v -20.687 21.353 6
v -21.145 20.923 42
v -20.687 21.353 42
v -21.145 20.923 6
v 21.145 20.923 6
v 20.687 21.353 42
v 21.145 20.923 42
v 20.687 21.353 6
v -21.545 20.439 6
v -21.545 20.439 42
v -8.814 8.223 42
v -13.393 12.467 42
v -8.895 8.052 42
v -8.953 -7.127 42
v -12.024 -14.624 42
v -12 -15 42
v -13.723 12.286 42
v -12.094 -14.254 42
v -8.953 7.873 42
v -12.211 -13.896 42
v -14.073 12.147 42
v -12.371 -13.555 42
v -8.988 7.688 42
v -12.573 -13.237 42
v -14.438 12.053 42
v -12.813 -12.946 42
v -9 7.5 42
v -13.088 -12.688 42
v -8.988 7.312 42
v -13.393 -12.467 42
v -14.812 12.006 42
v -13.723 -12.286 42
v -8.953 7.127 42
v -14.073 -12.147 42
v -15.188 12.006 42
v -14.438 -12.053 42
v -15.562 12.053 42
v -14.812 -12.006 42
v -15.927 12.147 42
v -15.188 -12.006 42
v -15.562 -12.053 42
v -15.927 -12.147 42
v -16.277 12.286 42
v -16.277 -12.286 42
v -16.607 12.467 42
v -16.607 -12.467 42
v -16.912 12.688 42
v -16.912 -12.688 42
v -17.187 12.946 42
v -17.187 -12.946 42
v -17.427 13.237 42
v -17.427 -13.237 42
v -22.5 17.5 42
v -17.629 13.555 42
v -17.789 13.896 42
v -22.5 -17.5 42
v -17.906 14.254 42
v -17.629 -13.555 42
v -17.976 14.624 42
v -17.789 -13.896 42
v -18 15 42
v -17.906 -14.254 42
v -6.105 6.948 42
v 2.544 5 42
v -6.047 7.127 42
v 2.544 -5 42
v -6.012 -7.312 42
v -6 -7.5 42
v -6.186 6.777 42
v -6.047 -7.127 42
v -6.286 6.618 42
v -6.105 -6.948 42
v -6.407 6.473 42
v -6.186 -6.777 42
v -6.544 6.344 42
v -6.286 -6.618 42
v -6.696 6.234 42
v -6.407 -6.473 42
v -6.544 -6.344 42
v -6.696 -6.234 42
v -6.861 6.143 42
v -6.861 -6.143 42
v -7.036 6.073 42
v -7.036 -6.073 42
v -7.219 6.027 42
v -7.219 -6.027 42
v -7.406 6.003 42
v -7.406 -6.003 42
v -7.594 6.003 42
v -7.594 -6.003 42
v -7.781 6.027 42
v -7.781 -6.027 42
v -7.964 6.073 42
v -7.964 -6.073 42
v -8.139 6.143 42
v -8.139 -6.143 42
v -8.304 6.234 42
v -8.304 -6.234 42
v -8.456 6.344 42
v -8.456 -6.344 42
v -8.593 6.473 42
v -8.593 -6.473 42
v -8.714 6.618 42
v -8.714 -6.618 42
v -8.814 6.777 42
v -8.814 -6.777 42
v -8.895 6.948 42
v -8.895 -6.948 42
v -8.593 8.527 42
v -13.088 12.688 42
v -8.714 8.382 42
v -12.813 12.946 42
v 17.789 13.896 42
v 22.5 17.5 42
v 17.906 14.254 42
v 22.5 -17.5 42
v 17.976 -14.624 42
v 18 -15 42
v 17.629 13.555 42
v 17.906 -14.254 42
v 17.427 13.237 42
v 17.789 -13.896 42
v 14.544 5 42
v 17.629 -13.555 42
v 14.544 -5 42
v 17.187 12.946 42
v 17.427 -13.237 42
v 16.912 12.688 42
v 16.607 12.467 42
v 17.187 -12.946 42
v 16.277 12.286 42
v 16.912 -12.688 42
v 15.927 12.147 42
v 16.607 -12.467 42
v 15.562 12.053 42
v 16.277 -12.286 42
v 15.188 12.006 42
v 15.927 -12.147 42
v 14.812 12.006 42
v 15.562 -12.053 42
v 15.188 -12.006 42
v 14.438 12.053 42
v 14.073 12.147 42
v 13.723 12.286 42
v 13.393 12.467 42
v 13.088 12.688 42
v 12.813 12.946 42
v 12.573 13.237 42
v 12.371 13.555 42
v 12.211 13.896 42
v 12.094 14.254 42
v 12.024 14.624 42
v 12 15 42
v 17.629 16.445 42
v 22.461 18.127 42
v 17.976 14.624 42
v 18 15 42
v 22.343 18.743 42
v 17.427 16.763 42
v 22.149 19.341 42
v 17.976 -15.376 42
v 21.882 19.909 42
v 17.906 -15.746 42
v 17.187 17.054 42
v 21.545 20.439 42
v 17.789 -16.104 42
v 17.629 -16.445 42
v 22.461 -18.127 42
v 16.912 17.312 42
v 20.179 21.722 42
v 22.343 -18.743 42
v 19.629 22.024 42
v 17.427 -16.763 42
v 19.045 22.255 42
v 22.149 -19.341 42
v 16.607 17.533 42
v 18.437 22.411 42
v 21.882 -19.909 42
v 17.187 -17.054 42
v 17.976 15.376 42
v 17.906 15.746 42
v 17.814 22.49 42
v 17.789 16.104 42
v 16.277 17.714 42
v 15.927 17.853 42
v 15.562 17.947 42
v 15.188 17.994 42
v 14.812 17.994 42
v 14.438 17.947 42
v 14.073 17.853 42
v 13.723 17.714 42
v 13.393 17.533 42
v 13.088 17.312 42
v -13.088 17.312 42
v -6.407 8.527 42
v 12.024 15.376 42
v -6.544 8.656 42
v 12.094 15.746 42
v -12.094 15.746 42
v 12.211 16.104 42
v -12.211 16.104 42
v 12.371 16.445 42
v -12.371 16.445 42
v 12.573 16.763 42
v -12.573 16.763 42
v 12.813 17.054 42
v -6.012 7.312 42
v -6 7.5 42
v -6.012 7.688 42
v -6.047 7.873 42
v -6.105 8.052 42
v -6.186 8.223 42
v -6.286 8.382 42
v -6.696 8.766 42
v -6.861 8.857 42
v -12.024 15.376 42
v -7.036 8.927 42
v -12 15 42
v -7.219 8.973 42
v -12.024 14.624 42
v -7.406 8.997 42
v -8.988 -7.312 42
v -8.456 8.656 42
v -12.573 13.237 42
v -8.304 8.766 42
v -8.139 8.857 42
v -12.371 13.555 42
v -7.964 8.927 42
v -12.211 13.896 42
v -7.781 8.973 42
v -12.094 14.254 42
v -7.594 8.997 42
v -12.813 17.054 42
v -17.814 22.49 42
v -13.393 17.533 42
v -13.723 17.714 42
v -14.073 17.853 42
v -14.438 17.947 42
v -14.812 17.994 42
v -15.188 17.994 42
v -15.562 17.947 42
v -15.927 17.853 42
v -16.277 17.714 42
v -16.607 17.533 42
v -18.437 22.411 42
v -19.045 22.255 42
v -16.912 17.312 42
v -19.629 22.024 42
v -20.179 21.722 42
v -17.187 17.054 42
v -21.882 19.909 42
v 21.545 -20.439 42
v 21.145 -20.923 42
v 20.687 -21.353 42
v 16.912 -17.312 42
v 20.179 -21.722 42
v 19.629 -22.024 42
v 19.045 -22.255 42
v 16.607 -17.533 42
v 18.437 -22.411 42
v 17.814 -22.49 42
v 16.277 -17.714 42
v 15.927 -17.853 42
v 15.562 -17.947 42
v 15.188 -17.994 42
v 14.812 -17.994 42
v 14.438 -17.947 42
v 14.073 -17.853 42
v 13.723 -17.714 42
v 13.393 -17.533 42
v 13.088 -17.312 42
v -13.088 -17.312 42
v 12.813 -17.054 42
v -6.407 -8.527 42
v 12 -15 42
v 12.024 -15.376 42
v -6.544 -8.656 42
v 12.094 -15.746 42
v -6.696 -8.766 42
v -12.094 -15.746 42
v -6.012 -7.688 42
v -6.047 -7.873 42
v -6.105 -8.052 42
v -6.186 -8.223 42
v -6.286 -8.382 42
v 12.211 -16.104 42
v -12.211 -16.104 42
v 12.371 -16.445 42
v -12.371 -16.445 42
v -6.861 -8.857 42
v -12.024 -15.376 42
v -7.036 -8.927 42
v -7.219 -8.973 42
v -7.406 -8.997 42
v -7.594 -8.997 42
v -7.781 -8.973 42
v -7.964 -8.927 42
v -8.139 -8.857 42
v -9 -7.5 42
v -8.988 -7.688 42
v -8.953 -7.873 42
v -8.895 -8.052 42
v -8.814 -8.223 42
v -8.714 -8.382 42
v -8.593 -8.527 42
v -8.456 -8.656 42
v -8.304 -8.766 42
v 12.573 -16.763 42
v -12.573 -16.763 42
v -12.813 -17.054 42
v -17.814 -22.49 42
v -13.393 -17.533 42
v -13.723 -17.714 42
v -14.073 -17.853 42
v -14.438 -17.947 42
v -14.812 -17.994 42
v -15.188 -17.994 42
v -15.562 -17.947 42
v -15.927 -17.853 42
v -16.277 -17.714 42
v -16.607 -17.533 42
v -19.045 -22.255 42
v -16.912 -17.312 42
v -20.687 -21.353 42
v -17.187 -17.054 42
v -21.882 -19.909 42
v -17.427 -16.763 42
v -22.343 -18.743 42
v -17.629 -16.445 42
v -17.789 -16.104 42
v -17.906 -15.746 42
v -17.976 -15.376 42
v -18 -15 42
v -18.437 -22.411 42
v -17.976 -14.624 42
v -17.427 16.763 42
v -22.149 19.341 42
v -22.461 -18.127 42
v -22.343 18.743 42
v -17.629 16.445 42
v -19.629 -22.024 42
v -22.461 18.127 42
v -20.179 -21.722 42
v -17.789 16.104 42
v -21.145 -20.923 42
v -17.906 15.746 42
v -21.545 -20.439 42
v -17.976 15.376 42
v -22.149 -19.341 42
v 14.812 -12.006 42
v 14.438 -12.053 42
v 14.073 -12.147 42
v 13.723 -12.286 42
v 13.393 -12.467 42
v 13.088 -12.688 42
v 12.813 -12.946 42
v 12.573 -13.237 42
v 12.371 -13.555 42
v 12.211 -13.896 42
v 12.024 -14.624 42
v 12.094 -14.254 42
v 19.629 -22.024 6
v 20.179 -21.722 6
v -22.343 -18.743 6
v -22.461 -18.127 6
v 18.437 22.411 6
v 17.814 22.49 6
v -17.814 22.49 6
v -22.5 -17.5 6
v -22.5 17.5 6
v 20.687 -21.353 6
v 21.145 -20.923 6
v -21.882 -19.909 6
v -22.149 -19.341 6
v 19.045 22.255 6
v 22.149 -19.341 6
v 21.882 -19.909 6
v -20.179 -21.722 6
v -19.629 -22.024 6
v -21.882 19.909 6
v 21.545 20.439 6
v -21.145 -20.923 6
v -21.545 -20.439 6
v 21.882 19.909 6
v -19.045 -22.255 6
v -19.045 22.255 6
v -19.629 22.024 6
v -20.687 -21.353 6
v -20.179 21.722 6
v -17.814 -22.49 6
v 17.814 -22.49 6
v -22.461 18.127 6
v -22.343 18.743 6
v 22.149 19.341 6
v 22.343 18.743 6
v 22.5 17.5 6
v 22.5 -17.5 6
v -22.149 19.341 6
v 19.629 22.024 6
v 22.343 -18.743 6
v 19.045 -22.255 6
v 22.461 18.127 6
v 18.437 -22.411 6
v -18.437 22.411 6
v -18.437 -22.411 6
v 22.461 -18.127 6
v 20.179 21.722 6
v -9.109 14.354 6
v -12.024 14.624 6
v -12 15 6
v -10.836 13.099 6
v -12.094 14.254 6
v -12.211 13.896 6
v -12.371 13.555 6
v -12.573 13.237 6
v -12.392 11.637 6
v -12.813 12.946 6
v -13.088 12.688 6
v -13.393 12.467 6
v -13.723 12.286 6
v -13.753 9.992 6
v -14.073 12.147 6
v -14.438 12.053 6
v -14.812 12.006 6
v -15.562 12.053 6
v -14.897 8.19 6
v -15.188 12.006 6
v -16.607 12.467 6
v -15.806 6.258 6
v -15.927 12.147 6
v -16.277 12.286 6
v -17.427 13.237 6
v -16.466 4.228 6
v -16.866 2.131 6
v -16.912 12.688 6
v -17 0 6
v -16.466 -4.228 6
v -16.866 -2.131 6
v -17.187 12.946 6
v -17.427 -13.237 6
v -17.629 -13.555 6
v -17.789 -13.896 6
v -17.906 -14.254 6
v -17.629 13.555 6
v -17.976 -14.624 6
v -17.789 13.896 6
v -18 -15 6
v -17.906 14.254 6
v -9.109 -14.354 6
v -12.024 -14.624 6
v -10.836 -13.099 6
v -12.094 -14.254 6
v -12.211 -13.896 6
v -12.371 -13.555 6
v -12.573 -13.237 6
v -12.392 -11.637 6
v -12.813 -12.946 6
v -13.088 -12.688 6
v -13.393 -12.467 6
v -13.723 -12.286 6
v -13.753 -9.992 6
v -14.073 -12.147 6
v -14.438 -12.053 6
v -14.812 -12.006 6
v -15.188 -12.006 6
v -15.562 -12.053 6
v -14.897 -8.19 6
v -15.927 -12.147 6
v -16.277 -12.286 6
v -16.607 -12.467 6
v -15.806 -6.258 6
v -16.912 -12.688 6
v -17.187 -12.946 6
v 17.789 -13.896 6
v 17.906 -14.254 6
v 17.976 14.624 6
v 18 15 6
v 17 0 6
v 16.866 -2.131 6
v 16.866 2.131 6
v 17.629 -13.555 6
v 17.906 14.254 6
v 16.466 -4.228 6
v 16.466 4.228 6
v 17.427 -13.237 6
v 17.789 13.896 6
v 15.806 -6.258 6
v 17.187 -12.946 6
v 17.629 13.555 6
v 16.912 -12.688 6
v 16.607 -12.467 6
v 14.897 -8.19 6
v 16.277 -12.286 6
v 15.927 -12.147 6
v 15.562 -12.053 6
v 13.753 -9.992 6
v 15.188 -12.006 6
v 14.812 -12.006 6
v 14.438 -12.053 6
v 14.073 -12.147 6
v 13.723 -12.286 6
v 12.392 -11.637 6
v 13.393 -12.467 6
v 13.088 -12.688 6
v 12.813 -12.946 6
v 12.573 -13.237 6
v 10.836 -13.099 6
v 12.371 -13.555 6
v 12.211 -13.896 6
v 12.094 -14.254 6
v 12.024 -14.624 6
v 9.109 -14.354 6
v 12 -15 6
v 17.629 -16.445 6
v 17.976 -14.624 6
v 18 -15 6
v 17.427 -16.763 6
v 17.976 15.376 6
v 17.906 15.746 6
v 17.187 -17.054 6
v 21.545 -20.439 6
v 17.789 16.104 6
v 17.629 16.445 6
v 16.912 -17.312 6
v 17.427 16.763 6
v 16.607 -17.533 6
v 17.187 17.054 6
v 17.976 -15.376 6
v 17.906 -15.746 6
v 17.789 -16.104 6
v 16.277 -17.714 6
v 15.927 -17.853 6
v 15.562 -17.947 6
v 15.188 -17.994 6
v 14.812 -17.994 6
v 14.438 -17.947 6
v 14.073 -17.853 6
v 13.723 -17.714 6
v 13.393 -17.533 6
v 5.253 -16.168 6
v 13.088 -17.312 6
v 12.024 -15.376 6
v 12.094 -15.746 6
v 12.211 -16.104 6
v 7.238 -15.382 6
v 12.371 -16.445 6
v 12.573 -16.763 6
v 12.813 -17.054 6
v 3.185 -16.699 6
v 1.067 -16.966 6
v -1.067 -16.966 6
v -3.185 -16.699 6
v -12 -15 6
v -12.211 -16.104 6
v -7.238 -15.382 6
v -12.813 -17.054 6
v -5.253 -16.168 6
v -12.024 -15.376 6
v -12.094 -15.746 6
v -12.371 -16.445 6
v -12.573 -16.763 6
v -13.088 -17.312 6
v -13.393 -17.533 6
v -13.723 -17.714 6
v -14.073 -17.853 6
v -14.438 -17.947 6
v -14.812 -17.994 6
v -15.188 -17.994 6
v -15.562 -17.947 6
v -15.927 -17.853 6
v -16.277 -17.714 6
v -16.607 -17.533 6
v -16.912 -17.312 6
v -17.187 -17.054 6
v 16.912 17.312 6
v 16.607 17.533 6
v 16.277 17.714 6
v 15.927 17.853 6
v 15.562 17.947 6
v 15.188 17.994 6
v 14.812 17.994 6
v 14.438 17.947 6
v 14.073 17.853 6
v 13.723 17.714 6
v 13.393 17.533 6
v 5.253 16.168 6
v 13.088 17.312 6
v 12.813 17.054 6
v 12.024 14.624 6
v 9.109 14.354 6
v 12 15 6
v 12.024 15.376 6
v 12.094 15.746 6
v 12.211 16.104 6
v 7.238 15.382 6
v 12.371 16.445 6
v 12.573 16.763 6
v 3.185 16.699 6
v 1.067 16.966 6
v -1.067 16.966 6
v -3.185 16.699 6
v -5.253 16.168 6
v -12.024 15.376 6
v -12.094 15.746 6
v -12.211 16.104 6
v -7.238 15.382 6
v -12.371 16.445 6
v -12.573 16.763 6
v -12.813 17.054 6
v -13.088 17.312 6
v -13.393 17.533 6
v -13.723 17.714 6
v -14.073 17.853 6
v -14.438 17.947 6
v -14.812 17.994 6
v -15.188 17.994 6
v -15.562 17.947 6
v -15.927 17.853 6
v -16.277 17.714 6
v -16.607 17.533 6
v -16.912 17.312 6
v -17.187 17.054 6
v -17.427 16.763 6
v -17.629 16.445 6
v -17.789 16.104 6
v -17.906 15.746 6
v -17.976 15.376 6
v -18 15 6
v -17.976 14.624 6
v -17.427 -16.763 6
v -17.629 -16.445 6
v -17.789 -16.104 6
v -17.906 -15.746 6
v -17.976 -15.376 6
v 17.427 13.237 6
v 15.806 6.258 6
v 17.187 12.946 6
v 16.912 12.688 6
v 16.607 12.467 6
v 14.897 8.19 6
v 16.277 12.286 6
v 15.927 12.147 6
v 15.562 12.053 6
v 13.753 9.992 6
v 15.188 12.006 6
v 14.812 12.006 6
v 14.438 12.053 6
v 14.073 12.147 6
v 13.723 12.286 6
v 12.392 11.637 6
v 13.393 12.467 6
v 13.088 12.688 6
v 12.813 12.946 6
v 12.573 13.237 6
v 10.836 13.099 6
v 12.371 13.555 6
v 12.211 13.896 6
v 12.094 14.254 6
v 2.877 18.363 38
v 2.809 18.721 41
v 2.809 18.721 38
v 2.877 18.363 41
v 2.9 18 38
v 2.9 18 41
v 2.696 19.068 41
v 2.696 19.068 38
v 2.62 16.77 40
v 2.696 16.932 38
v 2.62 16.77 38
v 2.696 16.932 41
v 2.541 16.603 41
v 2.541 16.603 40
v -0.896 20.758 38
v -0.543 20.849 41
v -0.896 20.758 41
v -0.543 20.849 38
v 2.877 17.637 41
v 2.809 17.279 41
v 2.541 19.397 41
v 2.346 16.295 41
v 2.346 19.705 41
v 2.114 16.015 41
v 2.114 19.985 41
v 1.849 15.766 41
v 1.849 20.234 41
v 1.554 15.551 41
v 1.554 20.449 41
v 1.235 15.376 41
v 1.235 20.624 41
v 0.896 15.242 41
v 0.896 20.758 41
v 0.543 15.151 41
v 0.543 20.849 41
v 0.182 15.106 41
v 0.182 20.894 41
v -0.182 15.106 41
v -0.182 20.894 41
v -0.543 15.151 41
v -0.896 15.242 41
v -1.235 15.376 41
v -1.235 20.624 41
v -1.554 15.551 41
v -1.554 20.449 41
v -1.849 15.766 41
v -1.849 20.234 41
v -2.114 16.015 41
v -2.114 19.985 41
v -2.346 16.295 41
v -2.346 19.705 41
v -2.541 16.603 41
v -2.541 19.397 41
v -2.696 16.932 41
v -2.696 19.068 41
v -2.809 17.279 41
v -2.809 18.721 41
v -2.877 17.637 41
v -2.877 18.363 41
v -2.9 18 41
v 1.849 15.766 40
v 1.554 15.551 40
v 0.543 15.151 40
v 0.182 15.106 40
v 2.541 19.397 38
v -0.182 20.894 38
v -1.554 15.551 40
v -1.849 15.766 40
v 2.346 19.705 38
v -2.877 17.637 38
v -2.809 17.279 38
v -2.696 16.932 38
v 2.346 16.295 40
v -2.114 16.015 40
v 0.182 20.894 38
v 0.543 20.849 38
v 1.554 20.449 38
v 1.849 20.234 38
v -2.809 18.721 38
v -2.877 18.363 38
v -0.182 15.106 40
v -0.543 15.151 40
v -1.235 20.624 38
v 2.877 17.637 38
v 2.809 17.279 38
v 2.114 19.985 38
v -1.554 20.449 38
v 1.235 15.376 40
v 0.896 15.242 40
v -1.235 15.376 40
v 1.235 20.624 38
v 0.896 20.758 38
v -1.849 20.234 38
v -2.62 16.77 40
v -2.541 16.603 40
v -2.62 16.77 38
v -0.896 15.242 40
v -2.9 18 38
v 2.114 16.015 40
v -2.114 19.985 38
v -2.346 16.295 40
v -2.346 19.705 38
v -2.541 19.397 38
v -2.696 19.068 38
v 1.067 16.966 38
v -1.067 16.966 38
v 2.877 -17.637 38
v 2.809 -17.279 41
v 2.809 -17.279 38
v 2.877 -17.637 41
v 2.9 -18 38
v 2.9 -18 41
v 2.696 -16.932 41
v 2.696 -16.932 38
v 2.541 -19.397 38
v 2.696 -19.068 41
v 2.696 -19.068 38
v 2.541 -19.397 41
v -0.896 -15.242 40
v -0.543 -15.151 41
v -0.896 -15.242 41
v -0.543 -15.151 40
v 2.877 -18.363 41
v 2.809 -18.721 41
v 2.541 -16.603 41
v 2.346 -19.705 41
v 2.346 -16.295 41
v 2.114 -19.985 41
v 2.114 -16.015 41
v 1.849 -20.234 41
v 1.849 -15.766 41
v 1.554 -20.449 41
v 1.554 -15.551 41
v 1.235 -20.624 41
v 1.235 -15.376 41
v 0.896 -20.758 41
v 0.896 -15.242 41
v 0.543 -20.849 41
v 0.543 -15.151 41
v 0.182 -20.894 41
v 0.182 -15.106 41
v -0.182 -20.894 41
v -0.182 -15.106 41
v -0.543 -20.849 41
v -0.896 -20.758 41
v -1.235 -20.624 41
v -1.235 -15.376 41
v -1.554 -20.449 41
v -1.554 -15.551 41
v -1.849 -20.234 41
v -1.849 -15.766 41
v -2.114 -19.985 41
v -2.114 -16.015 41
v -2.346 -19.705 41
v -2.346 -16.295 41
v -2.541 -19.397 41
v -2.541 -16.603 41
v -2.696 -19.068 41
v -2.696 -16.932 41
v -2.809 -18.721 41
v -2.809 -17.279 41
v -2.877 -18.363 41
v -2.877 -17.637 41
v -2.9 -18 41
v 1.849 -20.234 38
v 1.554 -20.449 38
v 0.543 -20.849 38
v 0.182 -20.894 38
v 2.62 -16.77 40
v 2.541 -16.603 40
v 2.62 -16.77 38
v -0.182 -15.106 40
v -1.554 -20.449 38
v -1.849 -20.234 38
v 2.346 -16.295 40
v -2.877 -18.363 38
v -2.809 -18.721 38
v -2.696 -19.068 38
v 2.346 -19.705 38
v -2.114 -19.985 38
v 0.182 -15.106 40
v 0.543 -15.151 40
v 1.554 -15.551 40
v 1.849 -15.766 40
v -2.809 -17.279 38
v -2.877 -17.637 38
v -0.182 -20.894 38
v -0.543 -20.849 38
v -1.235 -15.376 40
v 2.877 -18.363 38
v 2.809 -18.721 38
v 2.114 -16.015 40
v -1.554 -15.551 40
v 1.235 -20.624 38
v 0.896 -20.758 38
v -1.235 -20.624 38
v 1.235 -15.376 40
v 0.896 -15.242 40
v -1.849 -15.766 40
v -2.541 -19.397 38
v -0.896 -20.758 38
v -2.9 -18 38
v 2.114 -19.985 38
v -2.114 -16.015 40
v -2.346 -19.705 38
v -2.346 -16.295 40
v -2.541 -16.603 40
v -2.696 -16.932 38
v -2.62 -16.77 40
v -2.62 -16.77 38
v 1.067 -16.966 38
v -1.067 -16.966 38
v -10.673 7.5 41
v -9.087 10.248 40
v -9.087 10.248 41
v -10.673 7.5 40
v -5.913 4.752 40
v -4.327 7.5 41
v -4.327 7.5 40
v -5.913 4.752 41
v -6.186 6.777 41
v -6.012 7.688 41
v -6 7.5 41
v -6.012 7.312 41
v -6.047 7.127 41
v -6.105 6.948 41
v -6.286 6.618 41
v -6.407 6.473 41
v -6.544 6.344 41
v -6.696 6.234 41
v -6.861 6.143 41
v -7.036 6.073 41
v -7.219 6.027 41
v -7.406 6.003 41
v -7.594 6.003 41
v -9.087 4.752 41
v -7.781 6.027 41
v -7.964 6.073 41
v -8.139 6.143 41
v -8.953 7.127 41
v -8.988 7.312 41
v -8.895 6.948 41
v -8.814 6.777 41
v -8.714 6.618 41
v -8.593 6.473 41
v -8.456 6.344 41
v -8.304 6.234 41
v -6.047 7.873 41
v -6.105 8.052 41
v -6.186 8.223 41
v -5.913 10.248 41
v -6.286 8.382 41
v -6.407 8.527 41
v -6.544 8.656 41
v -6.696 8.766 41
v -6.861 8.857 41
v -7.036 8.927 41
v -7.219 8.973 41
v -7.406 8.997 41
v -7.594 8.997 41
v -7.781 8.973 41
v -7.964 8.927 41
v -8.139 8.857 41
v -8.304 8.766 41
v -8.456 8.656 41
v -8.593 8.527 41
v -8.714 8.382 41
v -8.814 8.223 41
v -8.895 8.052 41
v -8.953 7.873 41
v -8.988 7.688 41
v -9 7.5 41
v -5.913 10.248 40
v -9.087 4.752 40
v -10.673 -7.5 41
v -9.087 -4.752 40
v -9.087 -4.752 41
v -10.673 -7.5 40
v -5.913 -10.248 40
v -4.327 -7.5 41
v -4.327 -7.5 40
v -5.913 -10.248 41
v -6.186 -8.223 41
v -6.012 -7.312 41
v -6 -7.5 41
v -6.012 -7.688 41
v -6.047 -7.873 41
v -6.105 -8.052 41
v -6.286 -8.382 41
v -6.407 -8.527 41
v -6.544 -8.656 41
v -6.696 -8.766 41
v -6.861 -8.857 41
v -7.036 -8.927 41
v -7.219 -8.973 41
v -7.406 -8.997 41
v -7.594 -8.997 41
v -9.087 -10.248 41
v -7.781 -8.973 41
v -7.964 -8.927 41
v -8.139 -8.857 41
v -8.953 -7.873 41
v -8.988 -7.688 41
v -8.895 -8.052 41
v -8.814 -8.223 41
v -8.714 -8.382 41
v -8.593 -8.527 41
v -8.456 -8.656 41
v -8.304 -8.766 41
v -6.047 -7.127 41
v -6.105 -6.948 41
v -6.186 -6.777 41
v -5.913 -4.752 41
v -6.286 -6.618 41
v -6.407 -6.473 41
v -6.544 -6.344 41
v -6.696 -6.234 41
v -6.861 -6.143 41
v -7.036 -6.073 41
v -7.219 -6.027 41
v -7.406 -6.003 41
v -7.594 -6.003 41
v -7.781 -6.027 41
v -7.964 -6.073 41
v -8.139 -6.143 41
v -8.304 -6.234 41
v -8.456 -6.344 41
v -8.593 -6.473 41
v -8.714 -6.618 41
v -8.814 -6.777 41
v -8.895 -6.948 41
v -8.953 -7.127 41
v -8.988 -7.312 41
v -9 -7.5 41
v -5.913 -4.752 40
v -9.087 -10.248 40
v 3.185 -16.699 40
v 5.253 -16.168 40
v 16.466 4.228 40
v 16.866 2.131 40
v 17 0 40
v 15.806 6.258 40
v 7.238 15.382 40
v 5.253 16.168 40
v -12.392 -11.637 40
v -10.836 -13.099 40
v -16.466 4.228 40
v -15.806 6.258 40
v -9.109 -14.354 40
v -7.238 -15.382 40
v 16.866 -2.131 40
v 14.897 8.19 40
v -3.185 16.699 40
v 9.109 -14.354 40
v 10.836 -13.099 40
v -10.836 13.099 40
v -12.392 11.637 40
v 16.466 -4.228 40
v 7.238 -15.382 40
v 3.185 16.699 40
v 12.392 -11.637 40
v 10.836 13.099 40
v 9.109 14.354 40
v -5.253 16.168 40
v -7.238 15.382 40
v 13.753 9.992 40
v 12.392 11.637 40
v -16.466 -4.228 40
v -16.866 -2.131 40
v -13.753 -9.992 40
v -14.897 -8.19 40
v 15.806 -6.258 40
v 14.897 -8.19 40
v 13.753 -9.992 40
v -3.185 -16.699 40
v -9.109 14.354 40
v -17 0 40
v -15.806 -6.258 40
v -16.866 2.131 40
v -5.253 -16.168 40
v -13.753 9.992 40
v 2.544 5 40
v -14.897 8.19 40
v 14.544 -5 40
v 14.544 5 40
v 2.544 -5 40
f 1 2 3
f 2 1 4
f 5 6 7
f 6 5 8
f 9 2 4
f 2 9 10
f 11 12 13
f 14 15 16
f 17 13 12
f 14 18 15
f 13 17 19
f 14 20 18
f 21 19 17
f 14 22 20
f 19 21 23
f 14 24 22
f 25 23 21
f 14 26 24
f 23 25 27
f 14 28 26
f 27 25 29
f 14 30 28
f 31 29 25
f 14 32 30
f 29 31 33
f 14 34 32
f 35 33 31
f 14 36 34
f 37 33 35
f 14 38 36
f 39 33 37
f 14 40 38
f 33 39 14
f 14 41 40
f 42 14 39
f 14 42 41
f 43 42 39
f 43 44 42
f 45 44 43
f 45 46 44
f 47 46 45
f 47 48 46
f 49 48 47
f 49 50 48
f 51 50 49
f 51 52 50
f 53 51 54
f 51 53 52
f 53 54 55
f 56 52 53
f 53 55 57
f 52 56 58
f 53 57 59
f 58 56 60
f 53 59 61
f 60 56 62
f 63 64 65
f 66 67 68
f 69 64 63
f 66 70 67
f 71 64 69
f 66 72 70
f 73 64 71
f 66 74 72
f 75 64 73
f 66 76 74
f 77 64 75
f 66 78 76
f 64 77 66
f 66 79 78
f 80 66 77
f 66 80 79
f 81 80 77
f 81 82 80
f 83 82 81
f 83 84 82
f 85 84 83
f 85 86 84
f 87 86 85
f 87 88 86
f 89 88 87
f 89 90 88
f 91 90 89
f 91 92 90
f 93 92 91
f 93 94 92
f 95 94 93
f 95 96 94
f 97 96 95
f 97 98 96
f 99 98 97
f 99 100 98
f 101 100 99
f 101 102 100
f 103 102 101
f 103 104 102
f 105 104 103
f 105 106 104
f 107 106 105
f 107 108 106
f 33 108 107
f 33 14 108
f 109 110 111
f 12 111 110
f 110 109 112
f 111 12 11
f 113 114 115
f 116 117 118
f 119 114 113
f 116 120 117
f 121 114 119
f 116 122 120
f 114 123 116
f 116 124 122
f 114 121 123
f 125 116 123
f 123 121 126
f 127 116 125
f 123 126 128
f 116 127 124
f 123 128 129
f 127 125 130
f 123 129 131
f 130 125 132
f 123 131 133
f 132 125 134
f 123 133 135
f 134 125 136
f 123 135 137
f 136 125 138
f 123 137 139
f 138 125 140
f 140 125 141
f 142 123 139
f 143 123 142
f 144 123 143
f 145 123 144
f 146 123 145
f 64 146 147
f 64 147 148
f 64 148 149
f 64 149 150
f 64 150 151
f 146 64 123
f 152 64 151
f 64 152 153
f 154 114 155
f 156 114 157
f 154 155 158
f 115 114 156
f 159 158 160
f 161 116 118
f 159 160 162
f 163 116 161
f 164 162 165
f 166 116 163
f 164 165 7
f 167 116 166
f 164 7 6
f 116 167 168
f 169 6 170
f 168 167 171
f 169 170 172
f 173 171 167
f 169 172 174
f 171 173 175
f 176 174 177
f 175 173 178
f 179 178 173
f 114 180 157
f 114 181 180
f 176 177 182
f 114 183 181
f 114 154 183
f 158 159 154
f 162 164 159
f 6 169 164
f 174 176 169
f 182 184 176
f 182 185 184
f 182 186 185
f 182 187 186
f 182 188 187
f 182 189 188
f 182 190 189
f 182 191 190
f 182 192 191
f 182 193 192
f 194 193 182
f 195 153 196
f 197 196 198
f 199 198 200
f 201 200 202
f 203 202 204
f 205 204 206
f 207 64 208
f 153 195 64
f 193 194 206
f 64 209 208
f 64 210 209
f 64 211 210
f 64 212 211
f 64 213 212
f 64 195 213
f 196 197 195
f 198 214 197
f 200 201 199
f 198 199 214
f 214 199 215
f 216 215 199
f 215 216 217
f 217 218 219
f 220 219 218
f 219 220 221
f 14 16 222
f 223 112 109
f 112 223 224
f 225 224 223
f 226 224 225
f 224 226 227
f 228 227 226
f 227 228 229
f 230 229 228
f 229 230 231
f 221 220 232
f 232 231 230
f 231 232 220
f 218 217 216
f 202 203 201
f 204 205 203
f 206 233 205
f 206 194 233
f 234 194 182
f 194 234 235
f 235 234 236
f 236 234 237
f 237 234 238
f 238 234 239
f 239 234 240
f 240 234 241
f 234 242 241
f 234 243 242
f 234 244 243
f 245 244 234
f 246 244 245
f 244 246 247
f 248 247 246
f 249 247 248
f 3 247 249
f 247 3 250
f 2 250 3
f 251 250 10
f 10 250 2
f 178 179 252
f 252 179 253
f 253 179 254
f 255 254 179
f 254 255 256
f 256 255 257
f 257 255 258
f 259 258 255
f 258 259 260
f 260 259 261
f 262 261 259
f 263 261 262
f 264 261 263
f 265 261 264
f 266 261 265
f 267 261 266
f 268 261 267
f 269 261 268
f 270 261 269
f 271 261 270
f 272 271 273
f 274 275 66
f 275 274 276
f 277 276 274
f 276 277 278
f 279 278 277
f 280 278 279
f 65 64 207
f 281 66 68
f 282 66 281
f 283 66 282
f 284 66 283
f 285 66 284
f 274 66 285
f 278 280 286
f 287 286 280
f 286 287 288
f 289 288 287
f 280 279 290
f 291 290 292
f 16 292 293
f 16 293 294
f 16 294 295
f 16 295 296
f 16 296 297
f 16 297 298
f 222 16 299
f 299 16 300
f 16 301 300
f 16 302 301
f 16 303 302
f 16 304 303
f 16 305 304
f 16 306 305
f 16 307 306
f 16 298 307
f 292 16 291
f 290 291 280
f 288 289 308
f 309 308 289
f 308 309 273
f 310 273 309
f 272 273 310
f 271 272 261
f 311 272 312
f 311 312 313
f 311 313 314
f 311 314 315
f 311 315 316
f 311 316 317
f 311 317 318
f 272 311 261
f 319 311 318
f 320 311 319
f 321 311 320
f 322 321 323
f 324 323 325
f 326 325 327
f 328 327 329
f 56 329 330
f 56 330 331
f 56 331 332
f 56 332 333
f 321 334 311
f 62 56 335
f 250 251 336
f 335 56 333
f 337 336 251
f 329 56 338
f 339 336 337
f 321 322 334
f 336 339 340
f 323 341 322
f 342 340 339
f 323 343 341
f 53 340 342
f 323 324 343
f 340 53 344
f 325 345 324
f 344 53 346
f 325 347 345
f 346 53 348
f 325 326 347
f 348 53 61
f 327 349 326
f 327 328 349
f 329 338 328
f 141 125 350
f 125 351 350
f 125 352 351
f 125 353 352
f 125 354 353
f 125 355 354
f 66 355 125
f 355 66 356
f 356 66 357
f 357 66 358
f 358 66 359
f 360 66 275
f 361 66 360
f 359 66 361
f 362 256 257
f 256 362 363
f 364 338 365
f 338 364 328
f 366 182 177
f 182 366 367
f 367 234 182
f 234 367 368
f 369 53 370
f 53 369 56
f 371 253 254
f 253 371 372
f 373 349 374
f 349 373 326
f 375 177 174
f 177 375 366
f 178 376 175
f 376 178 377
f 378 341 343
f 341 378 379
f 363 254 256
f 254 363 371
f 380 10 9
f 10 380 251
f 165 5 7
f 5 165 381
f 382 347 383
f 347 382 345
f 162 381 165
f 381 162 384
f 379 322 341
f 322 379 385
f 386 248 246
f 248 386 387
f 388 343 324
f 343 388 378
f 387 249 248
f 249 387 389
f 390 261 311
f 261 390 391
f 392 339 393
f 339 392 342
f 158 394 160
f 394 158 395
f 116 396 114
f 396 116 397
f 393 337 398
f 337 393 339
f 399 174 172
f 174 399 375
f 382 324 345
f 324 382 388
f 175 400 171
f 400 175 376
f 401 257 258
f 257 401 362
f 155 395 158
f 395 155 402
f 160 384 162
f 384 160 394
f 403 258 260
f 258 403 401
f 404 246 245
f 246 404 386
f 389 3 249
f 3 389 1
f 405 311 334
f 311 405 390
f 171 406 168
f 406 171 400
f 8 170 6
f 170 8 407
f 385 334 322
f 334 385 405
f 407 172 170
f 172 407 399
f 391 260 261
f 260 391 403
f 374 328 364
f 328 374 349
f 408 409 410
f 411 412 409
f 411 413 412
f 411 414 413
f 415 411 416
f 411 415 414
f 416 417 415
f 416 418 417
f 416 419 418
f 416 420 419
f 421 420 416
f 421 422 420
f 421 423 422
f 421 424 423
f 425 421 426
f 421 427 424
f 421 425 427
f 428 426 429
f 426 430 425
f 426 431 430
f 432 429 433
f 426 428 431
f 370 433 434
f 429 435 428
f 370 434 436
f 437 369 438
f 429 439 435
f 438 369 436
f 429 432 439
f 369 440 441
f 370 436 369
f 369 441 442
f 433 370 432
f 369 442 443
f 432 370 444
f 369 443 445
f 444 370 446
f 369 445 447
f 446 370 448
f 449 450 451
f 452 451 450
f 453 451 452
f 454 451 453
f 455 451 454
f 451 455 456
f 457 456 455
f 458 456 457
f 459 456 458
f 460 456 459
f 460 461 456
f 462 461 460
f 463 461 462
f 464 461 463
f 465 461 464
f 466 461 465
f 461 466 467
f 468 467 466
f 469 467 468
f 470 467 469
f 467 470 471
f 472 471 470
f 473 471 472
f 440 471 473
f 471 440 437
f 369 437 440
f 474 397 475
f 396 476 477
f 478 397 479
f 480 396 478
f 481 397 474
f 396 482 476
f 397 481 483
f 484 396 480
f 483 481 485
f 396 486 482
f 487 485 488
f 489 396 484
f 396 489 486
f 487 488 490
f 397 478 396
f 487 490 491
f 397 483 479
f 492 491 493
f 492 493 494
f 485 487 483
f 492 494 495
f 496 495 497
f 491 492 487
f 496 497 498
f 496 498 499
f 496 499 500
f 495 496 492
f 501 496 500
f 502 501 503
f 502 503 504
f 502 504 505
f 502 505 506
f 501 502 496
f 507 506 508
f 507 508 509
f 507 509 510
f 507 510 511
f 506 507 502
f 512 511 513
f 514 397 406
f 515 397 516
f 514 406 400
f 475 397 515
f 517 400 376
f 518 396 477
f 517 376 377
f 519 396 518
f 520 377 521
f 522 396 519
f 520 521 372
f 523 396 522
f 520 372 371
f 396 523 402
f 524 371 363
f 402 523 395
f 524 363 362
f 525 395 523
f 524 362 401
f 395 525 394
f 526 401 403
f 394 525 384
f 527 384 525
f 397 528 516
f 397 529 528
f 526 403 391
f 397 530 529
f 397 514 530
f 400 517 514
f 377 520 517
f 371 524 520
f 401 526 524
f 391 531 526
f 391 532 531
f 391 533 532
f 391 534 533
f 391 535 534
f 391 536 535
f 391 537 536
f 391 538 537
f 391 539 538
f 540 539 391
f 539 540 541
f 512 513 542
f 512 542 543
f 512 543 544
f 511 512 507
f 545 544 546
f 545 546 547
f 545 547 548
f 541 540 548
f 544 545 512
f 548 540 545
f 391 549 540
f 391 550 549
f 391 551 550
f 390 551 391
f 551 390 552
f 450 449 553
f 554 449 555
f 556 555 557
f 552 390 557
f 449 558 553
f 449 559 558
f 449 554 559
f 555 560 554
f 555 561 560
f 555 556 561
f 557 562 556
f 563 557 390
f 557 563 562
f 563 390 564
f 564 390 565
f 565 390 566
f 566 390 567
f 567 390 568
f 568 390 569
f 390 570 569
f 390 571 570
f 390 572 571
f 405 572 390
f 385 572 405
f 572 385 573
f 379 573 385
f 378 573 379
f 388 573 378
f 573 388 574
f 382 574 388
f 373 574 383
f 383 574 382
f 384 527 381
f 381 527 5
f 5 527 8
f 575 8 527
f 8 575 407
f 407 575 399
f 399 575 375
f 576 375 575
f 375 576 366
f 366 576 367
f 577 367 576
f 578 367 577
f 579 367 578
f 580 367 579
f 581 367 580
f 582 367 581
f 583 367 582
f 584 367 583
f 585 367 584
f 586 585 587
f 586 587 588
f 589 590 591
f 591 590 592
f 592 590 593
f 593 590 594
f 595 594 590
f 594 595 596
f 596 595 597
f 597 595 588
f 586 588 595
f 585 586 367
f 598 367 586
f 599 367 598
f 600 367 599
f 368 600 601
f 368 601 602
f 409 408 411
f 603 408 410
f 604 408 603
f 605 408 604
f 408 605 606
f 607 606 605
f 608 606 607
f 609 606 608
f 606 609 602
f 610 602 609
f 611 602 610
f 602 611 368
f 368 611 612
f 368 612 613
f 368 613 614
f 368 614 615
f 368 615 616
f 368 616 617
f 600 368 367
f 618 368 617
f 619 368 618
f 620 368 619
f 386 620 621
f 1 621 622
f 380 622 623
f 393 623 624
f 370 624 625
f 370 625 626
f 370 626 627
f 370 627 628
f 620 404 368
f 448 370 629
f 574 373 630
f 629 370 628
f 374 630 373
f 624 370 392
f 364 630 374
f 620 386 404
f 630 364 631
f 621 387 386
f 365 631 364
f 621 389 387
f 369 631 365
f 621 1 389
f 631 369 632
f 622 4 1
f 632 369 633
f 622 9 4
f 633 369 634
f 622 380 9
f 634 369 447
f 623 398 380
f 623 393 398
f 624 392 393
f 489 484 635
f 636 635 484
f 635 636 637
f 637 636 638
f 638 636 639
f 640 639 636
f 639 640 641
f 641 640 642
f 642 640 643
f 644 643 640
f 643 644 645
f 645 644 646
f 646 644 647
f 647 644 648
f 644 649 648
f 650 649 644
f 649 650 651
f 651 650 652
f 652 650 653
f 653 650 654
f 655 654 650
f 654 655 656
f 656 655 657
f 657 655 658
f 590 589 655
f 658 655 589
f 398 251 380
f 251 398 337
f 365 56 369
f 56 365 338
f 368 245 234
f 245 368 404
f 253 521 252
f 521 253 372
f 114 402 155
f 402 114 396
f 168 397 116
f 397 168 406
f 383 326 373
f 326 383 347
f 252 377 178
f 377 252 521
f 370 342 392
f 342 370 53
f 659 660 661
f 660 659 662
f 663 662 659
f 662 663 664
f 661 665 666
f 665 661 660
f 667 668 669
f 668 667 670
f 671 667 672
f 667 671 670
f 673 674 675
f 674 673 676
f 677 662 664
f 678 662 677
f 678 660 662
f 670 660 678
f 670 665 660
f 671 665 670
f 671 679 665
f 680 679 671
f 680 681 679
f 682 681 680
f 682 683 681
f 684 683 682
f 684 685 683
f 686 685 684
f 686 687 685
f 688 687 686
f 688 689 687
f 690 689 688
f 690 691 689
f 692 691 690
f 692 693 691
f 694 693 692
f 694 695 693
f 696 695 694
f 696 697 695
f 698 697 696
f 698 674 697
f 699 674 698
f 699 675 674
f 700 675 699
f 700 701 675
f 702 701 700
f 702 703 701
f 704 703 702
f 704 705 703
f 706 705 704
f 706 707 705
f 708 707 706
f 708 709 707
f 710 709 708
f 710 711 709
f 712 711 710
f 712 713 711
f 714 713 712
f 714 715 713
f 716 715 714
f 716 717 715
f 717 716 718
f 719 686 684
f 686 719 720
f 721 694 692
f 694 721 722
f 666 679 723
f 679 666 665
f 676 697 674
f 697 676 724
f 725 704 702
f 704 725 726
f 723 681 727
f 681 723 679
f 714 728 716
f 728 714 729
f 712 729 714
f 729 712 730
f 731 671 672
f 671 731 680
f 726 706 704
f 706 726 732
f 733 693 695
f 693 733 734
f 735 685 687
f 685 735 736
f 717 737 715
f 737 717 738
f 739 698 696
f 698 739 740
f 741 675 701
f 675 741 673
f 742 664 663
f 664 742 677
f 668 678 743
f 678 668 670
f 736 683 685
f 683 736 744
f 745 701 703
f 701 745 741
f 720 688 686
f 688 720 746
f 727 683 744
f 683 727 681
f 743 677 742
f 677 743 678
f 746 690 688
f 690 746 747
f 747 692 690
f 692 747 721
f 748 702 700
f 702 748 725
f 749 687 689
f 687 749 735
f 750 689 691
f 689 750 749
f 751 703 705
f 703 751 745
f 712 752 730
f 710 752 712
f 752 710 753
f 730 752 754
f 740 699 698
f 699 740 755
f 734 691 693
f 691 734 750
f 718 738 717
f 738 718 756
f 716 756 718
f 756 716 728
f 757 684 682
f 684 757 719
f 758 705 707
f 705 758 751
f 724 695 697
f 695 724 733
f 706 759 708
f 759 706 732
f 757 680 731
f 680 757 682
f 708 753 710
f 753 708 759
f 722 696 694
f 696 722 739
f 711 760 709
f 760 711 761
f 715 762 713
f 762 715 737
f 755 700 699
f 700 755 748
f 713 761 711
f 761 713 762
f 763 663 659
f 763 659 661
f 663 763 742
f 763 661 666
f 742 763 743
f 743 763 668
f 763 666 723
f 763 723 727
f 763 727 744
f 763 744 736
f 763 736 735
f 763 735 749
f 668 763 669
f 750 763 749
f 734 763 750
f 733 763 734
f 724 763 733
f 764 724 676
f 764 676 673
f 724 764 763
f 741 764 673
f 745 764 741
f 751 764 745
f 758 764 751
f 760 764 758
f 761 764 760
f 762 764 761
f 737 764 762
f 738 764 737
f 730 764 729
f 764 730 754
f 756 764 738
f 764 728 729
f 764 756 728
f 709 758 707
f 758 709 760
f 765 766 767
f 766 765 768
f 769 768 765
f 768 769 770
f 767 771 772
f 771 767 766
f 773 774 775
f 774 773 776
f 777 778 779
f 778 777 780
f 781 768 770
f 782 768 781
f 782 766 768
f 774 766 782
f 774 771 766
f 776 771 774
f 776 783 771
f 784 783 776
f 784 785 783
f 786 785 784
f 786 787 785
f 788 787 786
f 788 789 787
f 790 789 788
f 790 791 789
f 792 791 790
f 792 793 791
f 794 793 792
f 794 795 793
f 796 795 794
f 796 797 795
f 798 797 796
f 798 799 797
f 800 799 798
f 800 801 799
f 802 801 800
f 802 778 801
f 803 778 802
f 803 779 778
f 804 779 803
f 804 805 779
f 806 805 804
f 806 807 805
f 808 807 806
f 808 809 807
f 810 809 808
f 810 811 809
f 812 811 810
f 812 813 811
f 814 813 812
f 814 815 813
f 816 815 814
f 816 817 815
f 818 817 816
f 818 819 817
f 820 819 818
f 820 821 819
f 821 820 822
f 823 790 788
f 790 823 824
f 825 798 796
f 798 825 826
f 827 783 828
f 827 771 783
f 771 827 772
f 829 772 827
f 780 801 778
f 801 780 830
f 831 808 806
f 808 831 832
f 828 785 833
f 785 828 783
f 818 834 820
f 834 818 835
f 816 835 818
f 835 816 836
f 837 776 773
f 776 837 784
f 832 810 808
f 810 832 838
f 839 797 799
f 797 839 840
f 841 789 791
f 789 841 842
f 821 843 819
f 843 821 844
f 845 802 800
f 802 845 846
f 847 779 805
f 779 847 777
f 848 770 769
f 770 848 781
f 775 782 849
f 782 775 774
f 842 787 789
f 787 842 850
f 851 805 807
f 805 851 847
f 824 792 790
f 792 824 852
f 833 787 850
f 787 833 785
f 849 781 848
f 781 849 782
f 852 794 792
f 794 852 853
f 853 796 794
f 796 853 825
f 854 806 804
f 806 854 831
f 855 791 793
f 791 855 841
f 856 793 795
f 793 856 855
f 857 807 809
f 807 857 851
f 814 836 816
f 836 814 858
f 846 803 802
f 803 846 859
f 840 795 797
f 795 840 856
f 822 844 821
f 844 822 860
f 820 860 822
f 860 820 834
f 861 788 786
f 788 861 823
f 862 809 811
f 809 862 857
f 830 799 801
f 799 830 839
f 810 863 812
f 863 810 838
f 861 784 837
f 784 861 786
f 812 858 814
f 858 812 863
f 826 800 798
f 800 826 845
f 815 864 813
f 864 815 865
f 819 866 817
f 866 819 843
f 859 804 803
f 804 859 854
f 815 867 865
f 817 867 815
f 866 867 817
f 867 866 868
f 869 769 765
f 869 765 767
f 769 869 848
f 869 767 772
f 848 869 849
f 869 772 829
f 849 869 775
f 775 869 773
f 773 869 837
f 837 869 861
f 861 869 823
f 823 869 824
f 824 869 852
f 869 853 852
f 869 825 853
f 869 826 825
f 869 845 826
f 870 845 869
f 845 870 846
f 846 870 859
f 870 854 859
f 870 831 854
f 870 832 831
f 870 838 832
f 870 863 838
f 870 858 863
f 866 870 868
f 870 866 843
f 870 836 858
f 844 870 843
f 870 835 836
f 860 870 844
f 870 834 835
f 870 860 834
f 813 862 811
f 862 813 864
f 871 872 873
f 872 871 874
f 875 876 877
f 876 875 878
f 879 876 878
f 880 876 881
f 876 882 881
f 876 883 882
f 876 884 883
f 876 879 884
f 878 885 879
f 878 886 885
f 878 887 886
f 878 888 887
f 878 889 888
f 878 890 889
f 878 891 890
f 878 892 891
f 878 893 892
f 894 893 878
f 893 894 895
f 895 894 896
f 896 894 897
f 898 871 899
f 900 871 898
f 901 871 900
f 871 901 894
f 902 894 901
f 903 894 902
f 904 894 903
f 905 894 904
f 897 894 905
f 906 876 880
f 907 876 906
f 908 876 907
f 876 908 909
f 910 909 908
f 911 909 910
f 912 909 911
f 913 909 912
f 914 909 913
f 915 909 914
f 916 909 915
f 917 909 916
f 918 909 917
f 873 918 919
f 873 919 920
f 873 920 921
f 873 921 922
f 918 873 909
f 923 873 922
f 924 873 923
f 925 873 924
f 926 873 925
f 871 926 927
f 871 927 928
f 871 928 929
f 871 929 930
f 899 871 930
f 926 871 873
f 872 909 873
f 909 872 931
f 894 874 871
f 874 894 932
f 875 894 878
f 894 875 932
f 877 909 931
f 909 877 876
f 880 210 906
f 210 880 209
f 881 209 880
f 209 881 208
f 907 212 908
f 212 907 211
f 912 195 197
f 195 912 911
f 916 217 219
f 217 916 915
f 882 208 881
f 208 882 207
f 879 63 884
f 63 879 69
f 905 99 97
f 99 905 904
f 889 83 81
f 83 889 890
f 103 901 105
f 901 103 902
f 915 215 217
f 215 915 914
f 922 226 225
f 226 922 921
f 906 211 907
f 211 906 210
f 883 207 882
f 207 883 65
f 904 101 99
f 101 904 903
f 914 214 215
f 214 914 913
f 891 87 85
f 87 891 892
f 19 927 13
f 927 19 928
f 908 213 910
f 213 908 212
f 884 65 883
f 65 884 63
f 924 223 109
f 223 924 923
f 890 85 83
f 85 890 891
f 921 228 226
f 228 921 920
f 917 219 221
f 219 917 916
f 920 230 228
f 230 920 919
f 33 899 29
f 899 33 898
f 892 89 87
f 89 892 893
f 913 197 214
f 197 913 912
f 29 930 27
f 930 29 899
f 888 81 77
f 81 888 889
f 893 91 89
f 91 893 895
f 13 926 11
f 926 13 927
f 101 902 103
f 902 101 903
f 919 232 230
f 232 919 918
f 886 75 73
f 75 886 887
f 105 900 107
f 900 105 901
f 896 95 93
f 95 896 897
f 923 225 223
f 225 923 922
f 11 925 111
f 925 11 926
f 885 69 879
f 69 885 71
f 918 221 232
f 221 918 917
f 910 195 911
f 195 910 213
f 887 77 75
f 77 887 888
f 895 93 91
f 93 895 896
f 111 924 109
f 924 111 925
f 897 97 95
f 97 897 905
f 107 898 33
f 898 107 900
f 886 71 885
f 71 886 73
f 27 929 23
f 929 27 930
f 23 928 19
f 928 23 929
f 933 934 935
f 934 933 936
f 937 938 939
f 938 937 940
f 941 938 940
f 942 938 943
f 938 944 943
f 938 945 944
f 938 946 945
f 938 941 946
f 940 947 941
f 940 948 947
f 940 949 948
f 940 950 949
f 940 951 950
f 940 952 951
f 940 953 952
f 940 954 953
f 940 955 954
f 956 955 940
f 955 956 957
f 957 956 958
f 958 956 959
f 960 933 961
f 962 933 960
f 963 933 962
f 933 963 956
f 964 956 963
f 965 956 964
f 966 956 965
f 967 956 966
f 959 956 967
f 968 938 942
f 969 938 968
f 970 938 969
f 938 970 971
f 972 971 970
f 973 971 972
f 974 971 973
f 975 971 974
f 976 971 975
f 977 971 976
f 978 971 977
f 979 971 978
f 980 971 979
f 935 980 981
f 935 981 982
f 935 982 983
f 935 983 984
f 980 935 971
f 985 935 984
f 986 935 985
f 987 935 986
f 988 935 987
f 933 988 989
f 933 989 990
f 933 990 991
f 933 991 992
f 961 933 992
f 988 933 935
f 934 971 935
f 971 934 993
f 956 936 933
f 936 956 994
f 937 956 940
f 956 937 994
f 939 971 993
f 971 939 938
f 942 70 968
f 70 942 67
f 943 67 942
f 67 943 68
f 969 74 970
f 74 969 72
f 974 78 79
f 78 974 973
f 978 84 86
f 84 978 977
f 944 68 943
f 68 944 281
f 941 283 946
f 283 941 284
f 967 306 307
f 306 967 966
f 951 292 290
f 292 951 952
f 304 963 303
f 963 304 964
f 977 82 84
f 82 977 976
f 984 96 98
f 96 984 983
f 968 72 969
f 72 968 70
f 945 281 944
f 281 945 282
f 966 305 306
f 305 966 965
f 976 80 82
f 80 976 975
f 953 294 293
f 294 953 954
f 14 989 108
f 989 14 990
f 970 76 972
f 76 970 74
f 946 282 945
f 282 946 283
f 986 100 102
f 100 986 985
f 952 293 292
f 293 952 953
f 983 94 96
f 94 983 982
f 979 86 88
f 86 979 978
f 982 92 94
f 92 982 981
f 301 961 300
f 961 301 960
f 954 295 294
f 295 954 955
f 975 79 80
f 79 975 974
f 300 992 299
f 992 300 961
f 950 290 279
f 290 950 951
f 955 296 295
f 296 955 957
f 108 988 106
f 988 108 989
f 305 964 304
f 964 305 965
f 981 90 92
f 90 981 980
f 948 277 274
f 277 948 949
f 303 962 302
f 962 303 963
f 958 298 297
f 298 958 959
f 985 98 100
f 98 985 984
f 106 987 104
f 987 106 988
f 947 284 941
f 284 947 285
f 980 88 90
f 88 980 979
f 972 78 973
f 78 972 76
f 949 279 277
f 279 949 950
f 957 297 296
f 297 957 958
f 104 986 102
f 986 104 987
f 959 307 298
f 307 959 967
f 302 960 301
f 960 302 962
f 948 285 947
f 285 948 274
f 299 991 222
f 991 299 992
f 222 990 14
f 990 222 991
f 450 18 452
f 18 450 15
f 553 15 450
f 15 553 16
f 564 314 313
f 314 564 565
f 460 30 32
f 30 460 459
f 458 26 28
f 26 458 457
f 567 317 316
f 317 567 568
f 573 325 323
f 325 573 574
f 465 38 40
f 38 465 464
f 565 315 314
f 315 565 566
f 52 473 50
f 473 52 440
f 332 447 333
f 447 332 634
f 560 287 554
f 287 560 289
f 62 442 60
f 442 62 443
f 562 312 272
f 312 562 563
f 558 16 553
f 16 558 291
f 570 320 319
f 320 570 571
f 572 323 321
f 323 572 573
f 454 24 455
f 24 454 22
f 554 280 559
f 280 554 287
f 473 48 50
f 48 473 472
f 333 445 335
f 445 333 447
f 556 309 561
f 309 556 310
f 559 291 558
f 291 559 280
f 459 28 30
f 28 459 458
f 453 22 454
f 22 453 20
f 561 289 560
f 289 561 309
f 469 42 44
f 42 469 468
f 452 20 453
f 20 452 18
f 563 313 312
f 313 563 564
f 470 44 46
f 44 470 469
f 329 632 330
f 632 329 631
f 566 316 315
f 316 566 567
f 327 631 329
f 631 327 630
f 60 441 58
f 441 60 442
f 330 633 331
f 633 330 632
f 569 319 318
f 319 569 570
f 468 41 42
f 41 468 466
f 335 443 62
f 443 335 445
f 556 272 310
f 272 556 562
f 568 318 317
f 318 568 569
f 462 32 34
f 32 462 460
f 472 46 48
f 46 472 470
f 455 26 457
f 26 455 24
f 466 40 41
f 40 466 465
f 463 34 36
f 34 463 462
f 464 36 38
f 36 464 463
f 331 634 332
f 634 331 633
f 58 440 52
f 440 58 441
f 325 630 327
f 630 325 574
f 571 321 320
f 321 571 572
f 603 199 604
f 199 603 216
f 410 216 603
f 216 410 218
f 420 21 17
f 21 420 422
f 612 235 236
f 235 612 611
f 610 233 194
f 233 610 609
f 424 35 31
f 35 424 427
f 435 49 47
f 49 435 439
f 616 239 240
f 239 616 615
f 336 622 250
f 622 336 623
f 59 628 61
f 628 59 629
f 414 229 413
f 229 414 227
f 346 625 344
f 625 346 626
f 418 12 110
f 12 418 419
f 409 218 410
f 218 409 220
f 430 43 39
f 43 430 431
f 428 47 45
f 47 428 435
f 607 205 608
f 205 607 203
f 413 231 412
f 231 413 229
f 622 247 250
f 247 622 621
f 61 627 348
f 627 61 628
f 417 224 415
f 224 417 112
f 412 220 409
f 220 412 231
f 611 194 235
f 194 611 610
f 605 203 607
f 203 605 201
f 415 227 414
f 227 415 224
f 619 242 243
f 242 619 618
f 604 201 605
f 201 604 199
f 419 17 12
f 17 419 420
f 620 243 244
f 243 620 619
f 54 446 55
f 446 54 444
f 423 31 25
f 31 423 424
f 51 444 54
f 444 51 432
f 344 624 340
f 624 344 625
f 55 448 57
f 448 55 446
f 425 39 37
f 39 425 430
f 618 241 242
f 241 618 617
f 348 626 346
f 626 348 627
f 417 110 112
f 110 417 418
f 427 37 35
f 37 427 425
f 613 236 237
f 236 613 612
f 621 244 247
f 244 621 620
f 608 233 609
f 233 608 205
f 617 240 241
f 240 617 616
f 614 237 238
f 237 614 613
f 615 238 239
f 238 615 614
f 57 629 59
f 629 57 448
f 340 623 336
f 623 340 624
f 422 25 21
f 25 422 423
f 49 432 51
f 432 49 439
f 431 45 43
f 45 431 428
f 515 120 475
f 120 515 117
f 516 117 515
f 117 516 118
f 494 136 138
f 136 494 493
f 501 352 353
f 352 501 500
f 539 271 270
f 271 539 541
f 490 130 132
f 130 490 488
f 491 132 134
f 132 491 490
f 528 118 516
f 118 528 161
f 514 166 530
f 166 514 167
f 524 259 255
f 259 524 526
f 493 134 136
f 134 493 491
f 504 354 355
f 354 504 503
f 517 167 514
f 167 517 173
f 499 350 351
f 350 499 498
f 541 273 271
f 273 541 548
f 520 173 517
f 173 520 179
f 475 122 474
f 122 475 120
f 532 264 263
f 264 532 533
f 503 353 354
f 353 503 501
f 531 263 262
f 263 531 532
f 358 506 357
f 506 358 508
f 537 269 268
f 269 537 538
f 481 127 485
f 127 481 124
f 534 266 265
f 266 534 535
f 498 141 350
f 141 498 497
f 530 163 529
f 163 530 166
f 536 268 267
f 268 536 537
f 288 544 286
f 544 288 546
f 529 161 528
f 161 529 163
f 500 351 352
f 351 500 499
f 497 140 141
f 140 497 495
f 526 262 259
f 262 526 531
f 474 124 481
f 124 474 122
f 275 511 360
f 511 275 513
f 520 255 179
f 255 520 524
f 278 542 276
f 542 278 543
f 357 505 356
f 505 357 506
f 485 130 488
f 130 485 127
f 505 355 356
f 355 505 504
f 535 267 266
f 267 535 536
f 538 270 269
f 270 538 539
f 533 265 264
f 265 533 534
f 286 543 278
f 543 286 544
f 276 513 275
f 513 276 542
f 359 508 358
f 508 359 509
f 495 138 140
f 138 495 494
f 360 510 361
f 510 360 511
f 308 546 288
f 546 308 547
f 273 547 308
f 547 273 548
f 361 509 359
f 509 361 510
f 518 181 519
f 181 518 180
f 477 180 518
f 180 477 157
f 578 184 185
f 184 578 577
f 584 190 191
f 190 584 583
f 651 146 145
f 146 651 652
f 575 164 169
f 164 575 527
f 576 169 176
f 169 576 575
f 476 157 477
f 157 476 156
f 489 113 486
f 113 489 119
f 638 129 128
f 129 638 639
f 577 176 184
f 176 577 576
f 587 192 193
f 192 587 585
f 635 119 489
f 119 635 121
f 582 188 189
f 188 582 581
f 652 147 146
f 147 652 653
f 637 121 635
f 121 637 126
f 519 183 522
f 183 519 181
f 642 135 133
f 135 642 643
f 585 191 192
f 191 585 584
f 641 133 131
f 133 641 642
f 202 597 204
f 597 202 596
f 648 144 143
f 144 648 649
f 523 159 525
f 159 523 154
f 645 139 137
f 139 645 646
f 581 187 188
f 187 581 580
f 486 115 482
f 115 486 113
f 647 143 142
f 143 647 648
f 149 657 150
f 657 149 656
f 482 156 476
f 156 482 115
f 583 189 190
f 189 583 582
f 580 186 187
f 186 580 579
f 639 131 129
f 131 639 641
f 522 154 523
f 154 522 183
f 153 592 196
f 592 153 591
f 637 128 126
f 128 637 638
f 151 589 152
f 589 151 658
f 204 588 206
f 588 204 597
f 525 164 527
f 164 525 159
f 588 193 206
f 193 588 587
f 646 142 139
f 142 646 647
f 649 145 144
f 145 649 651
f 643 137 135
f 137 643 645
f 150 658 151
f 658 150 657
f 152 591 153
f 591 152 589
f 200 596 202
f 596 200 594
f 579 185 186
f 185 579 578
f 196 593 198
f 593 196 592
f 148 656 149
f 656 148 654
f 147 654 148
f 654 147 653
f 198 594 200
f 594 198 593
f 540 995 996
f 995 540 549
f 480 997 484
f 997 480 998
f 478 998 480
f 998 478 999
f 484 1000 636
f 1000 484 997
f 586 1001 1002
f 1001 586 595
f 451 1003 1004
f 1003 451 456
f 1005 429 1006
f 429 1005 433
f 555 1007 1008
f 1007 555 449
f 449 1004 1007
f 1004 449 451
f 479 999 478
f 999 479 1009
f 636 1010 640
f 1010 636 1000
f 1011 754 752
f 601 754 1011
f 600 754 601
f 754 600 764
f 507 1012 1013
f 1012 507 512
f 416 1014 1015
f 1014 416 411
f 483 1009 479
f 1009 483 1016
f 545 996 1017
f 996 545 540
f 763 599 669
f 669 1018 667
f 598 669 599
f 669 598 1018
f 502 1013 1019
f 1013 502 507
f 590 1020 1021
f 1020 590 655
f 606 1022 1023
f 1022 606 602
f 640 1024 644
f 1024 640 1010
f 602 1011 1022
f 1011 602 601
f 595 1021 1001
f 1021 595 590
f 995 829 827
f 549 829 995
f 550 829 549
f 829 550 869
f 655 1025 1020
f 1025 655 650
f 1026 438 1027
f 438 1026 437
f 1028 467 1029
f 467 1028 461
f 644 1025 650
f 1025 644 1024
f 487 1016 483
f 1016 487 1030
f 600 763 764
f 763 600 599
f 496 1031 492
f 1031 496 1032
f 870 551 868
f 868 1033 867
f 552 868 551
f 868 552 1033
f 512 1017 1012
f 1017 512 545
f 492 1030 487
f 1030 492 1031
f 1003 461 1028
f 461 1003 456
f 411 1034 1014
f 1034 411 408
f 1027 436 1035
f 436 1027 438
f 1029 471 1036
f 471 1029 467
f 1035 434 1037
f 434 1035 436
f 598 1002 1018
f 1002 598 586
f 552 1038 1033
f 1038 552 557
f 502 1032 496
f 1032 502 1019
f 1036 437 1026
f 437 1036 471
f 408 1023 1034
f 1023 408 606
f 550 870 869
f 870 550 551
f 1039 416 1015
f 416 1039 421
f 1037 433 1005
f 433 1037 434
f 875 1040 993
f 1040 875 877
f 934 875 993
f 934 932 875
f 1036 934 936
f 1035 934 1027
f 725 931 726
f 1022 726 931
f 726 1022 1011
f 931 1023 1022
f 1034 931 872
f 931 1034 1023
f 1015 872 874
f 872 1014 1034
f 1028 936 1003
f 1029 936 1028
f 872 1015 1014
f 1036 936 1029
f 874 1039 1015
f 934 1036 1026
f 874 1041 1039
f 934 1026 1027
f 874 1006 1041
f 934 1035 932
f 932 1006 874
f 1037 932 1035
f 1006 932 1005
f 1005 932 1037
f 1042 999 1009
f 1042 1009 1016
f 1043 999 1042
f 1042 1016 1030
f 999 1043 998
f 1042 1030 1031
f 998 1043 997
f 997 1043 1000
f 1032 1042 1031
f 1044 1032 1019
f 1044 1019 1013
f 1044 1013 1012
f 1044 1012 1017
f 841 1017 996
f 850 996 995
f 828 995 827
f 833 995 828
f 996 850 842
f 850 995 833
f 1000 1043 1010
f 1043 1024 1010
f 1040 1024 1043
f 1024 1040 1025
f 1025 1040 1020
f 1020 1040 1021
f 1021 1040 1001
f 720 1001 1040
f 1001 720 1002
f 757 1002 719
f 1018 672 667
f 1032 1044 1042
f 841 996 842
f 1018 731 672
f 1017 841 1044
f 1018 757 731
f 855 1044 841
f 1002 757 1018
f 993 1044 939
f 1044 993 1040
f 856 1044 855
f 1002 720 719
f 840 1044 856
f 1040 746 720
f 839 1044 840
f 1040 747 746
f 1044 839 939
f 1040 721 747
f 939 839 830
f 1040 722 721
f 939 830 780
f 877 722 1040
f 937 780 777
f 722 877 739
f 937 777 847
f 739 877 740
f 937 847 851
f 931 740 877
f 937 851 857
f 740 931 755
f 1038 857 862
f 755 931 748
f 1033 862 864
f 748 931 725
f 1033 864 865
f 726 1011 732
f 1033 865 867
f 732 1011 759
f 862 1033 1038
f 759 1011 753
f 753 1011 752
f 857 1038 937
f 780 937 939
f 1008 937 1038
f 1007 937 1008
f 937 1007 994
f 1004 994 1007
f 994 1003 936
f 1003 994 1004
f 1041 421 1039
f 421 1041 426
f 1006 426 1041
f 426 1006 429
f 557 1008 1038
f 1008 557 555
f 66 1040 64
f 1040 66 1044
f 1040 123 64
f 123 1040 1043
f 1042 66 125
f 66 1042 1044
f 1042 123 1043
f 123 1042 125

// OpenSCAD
$fn = 50;


difference() {
	union() {
		translate(v = [0, 0, 6]) {
			hull() {
				translate(v = [-17.5000000000, 17.5000000000, 0]) {
					cylinder(h = 36, r = 5);
				}
				translate(v = [17.5000000000, 17.5000000000, 0]) {
					cylinder(h = 36, r = 5);
				}
				translate(v = [-17.5000000000, -17.5000000000, 0]) {
					cylinder(h = 36, r = 5);
				}
				translate(v = [17.5000000000, -17.5000000000, 0]) {
					cylinder(h = 36, r = 5);
				}
			}
		}
		translate(v = [0, 0, 6]) {
			hull() {
				translate(v = [-17.5000000000, 17.5000000000, 0]) {
					cylinder(h = 36, r = 5);
				}
				translate(v = [17.5000000000, 17.5000000000, 0]) {
					cylinder(h = 36, r = 5);
				}
				translate(v = [-17.5000000000, -17.5000000000, 0]) {
					cylinder(h = 36, r = 5);
				}
				translate(v = [17.5000000000, -17.5000000000, 0]) {
					cylinder(h = 36, r = 5);
				}
			}
		}
	}
	union() {
		translate(v = [0, 18, 38]) {
			rotate(a = [0, 0, 0]) {
				difference() {
					union() {
						cylinder(h = 3, r = 2.9000000000);
						translate(v = [0, 0, -350.0000000000]) {
							cylinder(h = 200, r = 1.5000000000);
						}
						translate(v = [0, 0, -350.0000000000]) {
							cylinder(h = 200, r = 1.8000000000);
						}
						translate(v = [0, 0, -350.0000000000]) {
							cylinder(h = 200, r = 1.5000000000);
						}
					}
					union();
				}
			}
		}
		translate(v = [0, -18, 38]) {
			rotate(a = [0, 0, 0]) {
				difference() {
					union() {
						cylinder(h = 3, r = 2.9000000000);
						translate(v = [0, 0, -350.0000000000]) {
							cylinder(h = 200, r = 1.5000000000);
						}
						translate(v = [0, 0, -350.0000000000]) {
							cylinder(h = 200, r = 1.8000000000);
						}
						translate(v = [0, 0, -350.0000000000]) {
							cylinder(h = 200, r = 1.5000000000);
						}
					}
					union();
				}
			}
		}
		translate(v = [-7.5000000000, 7.5000000000, 41]) {
			rotate(a = [0, 0, 0]) {
				difference() {
					union() {
						translate(v = [0, 0, -2.5000000000]) {
							linear_extrude(height = 2.5000000000) {
								polygon(points = [[3.1735000000, 0.0000000000], [1.5867500000, 2.7483316189], [-1.5867500000, 2.7483316189], [-3.1735000000, 0.0000000000], [-1.5867500000, -2.7483316189], [1.5867500000, -2.7483316189]]);
							}
						}
						translate(v = [0, 0, -100.0000000000]) {
							cylinder(h = 200, r = 1.5000000000);
						}
						translate(v = [0, 0, -100.0000000000]) {
							cylinder(h = 200, r = 1.5000000000);
						}
						translate(v = [0, 0, -100.0000000000]) {
							cylinder(h = 200, r = 1.5000000000);
						}
					}
					union();
				}
			}
		}
		translate(v = [-7.5000000000, -7.5000000000, 41]) {
			rotate(a = [0, 0, 0]) {
				difference() {
					union() {
						translate(v = [0, 0, -2.5000000000]) {
							linear_extrude(height = 2.5000000000) {
								polygon(points = [[3.1735000000, 0.0000000000], [1.5867500000, 2.7483316189], [-1.5867500000, 2.7483316189], [-3.1735000000, 0.0000000000], [-1.5867500000, -2.7483316189], [1.5867500000, -2.7483316189]]);
							}
						}
						translate(v = [0, 0, -100.0000000000]) {
							cylinder(h = 200, r = 1.5000000000);
						}
						translate(v = [0, 0, -100.0000000000]) {
							cylinder(h = 200, r = 1.5000000000);
						}
						translate(v = [0, 0, -100.0000000000]) {
							cylinder(h = 200, r = 1.5000000000);
						}
					}
					union();
				}
			}
		}
		translate(v = [-15.0000000000, -15.0000000000, -100.0000000000]) {
			cylinder(h = 200, r = 3.0000000000);
		}
		translate(v = [-15.0000000000, 15.0000000000, -100.0000000000]) {
			cylinder(h = 200, r = 3.0000000000);
		}
		translate(v = [15.0000000000, -15.0000000000, -100.0000000000]) {
			cylinder(h = 200, r = 3.0000000000);
		}
		translate(v = [15.0000000000, 15.0000000000, -100.0000000000]) {
			cylinder(h = 200, r = 3.0000000000);
		}
		translate(v = [0, 0, -1.0000000000]) {
			cylinder(h = 41, r = 17.0000000000);
		}
		#translate(v = [2.5440000000, -5.0000000000, 40]) {
			cube(size = [7, 10, 10]);
		}
		#translate(v = [7.5440000000, -5.0000000000, 40]) {
			cube(size = [7, 10, 10]);
		}
	}
}
